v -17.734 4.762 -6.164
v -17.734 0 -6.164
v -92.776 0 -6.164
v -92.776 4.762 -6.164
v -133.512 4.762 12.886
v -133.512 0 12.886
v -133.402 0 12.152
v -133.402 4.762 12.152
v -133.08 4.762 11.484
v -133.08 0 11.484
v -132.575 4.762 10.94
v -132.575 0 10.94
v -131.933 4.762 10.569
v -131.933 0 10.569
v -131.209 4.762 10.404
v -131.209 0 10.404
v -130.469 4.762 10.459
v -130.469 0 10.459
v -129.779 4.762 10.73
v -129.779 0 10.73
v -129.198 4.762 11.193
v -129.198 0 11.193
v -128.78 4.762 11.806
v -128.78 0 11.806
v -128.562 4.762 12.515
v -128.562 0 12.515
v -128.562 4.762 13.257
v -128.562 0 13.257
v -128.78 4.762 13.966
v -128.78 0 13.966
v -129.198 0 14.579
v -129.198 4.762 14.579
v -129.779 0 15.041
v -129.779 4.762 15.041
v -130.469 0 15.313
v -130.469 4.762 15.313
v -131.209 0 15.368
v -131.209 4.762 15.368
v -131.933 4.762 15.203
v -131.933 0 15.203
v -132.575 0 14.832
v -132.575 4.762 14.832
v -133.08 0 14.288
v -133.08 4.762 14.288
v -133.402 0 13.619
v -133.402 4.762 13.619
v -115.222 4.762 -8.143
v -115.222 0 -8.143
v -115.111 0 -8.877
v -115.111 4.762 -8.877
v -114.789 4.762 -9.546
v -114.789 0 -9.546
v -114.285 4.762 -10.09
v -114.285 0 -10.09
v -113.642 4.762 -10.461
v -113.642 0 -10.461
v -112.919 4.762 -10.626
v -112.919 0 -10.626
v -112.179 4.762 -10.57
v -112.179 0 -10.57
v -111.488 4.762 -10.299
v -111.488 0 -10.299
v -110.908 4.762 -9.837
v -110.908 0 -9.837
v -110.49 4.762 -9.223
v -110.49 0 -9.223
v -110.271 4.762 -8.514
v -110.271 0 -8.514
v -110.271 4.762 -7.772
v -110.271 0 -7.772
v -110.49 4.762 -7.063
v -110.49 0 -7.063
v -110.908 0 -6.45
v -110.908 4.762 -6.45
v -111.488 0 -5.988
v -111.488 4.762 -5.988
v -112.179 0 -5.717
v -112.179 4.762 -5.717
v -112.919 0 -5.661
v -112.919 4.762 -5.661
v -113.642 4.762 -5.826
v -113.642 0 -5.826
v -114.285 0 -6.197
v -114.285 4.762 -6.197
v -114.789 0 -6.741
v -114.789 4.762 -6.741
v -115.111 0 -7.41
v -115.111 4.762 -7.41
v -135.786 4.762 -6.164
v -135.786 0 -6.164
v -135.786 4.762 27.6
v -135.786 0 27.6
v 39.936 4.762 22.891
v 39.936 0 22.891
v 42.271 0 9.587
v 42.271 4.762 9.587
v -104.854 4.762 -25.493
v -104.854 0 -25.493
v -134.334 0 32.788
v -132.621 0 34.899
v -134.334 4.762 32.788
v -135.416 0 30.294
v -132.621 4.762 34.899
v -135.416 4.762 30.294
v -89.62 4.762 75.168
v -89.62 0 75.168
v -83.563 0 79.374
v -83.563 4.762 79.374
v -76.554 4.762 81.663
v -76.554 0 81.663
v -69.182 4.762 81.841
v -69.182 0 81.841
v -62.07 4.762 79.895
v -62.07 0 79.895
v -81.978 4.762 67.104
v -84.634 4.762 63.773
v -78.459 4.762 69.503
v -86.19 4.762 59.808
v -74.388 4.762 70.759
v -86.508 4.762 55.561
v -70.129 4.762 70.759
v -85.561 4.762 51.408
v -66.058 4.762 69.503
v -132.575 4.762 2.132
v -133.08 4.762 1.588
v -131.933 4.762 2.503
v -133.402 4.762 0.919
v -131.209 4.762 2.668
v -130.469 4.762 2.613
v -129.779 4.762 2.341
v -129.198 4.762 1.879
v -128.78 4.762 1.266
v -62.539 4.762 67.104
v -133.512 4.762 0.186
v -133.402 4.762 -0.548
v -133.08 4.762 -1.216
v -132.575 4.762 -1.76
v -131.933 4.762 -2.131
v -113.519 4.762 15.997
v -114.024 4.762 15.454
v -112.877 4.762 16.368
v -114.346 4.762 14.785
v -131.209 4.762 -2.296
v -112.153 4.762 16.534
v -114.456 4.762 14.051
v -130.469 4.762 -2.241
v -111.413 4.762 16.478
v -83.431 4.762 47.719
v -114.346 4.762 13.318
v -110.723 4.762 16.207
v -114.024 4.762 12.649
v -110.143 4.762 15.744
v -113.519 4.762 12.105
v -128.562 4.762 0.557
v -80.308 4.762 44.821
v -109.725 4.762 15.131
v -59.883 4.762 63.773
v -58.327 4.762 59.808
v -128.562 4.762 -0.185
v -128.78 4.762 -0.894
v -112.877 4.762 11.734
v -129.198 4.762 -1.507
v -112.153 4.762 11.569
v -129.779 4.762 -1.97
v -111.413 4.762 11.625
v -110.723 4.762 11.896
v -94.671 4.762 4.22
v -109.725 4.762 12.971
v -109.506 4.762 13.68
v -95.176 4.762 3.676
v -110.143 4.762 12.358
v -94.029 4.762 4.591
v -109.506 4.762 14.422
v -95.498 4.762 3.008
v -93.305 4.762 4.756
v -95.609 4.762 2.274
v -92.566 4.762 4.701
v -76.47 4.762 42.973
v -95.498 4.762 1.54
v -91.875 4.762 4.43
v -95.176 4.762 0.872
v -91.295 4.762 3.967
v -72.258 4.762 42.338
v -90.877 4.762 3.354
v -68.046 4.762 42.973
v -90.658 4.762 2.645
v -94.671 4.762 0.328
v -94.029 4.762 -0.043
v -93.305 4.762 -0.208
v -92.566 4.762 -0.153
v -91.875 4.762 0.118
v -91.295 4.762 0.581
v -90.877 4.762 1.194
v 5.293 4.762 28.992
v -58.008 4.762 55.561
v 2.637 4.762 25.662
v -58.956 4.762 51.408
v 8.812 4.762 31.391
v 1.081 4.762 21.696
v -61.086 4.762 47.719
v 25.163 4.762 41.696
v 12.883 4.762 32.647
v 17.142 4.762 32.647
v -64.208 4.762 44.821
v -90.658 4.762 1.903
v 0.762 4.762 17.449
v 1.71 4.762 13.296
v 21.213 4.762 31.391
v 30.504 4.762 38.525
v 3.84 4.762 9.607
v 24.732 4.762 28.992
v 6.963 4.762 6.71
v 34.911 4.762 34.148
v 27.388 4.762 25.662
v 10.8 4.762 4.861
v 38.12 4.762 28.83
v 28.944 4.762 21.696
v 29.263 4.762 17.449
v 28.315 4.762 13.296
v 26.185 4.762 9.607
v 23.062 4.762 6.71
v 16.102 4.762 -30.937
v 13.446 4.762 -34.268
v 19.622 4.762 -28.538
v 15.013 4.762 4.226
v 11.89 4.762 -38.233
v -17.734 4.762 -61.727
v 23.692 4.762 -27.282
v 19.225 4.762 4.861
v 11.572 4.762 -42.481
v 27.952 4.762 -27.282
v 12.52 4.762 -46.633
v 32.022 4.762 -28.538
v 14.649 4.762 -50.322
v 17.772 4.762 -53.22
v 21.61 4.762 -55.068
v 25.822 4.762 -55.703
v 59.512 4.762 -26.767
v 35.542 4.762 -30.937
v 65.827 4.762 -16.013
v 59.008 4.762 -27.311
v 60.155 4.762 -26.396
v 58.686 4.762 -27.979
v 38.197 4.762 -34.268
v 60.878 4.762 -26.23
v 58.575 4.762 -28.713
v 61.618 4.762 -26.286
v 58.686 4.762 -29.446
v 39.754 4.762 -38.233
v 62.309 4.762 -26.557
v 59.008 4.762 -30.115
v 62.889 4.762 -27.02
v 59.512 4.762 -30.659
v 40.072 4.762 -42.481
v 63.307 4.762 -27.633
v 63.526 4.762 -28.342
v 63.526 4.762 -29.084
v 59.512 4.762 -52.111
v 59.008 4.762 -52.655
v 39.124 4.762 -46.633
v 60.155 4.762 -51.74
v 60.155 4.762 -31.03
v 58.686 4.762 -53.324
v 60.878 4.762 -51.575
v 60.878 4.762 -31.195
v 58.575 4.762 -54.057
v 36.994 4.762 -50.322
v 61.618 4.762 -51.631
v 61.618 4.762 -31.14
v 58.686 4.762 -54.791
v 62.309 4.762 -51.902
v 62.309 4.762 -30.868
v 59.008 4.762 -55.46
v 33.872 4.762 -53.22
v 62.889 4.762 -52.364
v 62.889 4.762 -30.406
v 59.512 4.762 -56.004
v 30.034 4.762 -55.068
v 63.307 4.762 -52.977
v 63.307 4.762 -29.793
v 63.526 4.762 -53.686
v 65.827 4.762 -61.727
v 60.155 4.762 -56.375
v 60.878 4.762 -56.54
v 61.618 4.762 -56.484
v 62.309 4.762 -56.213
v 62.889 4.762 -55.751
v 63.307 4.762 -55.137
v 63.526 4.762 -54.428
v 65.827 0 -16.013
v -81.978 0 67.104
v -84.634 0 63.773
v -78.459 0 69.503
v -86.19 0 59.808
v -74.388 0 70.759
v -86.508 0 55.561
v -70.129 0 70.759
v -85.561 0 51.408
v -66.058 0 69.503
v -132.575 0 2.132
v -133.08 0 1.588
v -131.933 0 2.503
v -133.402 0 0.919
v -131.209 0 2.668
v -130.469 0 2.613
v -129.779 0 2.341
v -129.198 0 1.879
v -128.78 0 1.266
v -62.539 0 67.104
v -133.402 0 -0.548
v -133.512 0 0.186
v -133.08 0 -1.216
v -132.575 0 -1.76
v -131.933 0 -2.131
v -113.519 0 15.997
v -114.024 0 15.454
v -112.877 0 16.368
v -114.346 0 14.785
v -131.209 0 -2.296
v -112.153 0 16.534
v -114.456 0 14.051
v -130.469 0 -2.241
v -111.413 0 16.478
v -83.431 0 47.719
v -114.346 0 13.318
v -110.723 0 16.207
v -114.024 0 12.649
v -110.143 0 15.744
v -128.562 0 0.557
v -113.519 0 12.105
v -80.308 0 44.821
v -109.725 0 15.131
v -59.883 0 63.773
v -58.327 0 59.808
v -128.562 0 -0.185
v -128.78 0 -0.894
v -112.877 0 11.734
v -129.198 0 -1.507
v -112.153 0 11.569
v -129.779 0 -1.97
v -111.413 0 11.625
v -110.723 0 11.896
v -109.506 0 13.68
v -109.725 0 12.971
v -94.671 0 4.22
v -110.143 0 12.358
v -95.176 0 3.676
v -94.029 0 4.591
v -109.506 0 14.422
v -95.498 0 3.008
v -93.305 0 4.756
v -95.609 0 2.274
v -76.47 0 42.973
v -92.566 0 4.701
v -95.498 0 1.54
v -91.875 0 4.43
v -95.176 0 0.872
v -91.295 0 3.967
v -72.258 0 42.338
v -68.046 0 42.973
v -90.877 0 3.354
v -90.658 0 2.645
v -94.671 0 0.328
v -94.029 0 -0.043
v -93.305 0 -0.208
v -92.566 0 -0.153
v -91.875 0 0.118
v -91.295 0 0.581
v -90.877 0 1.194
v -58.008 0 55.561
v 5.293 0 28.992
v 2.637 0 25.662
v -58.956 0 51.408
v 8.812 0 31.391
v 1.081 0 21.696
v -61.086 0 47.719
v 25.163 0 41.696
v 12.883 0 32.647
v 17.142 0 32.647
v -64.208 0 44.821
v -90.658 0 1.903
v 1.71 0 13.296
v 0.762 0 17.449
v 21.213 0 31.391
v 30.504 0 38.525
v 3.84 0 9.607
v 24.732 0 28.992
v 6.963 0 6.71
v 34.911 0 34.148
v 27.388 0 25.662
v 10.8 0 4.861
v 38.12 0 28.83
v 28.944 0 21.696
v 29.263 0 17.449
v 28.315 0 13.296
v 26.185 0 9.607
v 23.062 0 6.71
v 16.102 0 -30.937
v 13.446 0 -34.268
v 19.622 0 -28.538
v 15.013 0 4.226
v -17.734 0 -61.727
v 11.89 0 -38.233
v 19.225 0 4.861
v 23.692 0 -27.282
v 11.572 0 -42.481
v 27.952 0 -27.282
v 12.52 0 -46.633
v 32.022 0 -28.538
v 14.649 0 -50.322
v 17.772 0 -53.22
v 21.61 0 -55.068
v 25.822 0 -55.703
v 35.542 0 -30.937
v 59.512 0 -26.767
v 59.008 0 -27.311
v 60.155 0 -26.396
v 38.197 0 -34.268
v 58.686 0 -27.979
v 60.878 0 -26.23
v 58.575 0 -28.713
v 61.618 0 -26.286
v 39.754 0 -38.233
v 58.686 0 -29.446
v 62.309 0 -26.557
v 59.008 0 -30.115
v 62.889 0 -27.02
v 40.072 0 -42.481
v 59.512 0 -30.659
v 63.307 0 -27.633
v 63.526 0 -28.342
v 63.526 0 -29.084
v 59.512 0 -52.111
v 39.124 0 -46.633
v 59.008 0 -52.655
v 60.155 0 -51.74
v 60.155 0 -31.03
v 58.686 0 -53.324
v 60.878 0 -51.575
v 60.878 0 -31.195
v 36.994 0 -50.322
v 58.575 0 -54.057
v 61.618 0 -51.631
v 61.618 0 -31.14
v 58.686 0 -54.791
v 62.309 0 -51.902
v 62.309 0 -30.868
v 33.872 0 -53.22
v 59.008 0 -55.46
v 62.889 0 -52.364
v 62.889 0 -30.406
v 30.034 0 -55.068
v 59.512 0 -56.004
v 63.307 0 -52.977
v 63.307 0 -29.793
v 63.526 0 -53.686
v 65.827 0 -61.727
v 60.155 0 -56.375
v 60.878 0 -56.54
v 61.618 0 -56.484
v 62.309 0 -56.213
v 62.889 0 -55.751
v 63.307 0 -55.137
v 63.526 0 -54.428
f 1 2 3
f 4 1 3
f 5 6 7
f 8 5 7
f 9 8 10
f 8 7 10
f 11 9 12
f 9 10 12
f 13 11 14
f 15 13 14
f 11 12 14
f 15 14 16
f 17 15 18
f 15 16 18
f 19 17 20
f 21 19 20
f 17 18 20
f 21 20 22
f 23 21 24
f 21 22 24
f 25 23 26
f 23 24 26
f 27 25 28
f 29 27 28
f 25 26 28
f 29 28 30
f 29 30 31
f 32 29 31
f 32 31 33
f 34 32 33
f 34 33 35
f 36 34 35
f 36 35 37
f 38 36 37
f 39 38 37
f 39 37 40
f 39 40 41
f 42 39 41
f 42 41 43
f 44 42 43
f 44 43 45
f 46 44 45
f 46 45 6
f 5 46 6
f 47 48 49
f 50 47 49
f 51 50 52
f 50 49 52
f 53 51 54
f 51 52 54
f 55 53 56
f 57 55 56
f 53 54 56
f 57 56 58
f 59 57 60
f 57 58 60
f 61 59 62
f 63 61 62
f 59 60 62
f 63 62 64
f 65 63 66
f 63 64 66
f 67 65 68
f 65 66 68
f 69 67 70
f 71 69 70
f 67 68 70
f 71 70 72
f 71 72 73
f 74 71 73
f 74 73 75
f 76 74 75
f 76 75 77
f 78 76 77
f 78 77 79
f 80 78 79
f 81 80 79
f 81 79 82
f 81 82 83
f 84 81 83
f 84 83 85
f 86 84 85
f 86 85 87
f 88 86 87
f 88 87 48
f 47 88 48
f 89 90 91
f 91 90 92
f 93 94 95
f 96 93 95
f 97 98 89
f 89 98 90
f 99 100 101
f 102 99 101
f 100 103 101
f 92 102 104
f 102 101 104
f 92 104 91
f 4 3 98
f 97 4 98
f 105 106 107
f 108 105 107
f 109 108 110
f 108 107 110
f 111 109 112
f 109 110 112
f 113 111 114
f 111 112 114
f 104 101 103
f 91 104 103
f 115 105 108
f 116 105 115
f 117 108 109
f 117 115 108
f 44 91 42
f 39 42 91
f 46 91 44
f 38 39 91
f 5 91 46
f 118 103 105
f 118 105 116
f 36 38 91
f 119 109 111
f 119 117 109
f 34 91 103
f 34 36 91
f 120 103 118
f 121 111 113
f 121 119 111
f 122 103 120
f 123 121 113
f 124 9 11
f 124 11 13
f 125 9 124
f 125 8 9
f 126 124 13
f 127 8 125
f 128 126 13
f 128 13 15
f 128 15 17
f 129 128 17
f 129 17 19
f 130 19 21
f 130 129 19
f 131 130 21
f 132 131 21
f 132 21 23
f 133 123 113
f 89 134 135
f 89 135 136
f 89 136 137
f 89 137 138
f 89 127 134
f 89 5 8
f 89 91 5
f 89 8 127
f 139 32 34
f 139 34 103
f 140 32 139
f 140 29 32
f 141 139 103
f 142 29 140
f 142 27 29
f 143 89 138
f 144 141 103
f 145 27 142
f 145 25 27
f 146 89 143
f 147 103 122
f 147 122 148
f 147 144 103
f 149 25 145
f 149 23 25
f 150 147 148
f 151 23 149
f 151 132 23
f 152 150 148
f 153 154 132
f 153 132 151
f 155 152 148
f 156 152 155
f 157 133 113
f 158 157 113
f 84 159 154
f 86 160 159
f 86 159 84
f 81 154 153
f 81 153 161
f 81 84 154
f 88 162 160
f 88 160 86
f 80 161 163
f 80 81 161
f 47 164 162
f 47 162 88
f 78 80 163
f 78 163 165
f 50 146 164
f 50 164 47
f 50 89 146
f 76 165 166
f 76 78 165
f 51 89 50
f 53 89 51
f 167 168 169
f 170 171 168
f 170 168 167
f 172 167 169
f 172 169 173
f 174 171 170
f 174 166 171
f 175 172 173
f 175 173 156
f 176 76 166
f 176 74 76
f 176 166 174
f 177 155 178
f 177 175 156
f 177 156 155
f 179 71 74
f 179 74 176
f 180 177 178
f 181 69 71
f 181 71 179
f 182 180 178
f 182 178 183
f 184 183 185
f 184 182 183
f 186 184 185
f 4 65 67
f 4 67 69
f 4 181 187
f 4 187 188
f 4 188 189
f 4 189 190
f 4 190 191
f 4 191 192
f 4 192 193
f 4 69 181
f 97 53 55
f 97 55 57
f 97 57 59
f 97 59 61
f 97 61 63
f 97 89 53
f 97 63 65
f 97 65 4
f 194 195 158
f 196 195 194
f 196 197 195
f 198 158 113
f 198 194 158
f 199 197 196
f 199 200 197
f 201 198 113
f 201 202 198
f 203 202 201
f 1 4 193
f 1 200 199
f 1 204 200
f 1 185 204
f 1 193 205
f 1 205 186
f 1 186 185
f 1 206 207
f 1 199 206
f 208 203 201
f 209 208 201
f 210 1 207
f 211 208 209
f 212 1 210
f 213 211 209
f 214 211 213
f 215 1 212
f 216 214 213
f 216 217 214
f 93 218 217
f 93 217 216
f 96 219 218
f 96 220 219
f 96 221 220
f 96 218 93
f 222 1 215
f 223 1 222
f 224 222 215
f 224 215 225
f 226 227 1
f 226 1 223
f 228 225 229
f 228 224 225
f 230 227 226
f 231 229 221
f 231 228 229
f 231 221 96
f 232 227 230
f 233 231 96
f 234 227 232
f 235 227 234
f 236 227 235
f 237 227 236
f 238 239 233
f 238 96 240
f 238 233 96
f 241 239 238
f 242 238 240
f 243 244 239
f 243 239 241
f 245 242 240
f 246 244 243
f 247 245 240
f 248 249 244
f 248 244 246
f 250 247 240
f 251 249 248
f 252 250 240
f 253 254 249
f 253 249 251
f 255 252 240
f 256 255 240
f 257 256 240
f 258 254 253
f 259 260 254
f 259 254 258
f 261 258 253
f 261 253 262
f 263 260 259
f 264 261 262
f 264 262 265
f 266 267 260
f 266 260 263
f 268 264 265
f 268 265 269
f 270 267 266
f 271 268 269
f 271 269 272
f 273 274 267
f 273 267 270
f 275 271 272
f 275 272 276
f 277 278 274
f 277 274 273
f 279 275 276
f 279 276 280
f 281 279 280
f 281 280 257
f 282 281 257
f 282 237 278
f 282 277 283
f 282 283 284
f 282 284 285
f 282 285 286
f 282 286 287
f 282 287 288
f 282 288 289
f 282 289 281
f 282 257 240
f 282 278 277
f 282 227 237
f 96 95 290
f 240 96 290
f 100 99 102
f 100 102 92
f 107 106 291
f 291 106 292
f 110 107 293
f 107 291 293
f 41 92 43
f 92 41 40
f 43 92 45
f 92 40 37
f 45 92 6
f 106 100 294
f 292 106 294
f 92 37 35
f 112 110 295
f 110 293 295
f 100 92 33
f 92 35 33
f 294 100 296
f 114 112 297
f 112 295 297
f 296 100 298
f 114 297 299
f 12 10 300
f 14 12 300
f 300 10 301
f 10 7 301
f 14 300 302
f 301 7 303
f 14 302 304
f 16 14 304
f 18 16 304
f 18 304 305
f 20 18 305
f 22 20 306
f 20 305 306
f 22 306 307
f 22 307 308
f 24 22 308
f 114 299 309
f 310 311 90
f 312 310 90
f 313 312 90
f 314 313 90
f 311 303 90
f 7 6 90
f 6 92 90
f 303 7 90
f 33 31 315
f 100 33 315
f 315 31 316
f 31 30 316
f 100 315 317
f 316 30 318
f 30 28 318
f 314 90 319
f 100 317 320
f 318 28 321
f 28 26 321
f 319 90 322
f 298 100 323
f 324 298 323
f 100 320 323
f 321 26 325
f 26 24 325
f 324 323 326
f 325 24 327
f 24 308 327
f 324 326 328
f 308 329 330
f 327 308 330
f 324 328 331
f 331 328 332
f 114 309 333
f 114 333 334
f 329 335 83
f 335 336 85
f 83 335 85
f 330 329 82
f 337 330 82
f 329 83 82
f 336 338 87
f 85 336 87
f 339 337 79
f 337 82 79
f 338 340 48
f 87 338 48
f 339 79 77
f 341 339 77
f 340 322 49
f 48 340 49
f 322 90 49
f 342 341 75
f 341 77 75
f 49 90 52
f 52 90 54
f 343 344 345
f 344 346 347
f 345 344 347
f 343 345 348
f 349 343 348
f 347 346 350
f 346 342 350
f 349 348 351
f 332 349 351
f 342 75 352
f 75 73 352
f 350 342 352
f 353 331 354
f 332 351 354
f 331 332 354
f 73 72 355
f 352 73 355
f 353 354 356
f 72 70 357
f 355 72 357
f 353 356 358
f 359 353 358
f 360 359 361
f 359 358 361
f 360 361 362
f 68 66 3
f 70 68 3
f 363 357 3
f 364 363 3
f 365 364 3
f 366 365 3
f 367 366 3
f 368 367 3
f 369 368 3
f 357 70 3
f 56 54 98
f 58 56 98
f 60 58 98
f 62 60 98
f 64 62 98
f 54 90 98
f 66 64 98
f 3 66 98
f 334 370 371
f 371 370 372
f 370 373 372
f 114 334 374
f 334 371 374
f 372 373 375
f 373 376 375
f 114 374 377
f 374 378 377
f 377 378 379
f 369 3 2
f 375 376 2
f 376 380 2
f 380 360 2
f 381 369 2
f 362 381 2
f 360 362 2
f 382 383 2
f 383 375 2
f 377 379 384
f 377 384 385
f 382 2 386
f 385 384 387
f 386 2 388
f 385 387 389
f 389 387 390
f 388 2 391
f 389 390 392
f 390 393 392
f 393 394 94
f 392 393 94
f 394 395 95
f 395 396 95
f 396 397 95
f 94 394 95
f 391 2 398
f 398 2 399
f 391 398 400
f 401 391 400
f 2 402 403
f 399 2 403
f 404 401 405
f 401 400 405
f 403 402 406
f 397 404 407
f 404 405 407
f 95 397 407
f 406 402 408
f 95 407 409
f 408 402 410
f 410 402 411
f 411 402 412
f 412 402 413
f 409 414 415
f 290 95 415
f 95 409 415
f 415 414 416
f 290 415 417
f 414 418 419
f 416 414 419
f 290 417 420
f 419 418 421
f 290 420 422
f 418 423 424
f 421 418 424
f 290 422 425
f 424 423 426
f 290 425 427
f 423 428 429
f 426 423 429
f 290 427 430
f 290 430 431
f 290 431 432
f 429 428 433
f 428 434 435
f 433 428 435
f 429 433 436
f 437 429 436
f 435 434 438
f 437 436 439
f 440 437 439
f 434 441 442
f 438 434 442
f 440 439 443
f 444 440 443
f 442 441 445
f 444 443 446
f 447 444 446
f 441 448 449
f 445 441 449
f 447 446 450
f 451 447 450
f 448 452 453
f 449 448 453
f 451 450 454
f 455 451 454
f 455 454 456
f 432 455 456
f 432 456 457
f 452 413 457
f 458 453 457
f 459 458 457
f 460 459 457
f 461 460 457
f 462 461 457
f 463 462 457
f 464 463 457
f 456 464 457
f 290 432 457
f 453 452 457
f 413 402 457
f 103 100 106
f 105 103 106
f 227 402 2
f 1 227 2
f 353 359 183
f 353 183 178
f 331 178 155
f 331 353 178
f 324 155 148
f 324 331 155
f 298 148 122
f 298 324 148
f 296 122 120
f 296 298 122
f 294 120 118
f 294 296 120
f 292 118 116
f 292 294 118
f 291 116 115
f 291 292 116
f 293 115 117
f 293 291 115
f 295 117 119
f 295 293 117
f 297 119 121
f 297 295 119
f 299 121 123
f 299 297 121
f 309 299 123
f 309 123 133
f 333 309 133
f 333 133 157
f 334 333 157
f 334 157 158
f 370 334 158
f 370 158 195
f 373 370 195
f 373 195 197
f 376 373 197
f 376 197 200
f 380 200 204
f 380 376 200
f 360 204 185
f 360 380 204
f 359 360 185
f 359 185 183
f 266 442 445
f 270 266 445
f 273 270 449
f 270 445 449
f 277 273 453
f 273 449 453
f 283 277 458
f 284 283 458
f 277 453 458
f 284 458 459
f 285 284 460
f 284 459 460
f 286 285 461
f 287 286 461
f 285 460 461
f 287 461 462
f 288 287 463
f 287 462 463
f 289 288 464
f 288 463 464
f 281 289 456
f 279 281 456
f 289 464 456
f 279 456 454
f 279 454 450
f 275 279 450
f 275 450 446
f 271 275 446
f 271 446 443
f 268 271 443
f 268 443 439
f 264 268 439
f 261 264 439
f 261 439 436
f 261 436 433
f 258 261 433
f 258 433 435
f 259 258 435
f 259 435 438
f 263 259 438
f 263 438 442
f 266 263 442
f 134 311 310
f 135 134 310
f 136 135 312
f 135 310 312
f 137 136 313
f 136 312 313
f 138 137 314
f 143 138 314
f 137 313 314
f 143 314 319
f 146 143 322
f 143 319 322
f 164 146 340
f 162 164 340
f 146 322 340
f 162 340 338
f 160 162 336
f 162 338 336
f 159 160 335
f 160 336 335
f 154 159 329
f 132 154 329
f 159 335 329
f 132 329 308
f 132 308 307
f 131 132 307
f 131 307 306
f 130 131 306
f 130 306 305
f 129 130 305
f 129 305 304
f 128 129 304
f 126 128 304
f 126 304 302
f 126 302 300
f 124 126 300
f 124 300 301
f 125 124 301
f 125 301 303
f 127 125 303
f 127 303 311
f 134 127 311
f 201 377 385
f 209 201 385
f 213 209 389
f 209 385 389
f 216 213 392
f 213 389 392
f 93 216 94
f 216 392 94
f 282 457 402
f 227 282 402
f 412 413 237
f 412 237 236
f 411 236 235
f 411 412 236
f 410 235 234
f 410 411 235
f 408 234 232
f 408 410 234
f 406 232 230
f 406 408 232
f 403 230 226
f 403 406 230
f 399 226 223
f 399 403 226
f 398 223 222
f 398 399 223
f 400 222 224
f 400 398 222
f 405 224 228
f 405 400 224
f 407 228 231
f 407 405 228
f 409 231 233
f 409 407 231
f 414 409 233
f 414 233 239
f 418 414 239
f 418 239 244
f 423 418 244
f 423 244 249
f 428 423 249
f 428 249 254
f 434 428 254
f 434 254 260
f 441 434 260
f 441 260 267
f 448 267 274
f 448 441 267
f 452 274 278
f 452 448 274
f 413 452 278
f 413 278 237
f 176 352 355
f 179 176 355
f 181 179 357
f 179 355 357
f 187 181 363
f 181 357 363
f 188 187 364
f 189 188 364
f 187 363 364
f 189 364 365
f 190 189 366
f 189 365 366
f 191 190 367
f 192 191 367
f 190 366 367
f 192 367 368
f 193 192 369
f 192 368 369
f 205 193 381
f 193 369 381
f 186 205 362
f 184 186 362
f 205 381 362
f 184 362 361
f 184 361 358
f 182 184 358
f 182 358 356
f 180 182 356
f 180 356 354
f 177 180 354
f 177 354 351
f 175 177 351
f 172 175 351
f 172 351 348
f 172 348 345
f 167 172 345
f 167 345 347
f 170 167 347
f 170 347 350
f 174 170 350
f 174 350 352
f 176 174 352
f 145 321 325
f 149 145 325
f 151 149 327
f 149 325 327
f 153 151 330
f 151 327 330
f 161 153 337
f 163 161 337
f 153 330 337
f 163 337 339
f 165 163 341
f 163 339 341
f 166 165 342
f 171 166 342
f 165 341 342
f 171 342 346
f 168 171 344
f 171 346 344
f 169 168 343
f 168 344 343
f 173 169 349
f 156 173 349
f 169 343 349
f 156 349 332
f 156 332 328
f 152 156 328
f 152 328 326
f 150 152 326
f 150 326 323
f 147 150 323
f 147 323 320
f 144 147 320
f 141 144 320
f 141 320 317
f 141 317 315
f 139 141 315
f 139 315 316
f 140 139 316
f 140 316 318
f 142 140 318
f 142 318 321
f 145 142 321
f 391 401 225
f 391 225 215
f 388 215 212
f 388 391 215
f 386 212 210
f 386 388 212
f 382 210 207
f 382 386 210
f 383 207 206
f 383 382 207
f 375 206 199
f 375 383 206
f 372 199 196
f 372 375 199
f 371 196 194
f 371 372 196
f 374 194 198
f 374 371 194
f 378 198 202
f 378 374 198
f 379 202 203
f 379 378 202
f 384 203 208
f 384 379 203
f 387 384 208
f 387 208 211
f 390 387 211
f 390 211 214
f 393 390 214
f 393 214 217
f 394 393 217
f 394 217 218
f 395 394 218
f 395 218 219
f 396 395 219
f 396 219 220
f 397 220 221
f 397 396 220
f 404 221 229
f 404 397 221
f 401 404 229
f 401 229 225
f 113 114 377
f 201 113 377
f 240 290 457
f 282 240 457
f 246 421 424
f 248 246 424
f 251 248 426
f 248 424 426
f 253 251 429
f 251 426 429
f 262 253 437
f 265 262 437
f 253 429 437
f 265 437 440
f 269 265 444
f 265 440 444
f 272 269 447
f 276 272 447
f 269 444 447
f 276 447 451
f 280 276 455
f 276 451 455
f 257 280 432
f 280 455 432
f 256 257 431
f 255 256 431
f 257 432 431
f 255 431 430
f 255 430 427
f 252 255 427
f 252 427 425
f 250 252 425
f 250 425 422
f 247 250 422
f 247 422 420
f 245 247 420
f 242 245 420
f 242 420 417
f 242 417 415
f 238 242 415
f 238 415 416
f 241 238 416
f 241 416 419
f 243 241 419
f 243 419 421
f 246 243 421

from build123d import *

# Parameters (mm, degrees)
SKETCH1_R              = 14.29004
BOSS_EXTRUDE1_DEPTH    = 4.7625
FILLET1_R              = 10
F_10_CLEARANCE_HOLE1_D = 4.9784
F_10_CLEARANCE_HOLE2_D = 4.9784


with BuildPart() as part:
    # Sketch1 → Boss-Extrude1 (new body)
    with BuildSketch(Plane(origin=(0, 0, 0), x_dir=(1, 0, 0), z_dir=(0, 1, 0))):
        with BuildLine():
            Line((-62.06952, -79.895280222), (25.163028109, -41.695780276))
            ThreePointArc((25.163028109, -41.695780276), (34.911191298, -34.148496119), (39.936134607, -22.890693115))
            Line((39.936134607, -22.890693115), (42.271095404, -9.586739751))
            Line((42.271095404, -9.586739751), (65.82695514, 16.012754812))
            Line((65.82695514, 16.012754812), (65.826833771, 61.726825209))
            Line((65.826833771, 61.726825209), (-17.734439664, 61.726825209))
            Line((-17.734439664, 61.726825209), (-17.734439664, 6.164245545))
            Line((-17.734439664, 6.164245545), (-92.776319002, 6.164245545))
            Line((-92.776319002, 6.164245545), (-104.854054452, 25.49254843))
            Line((-104.854054452, 25.49254843), (-135.785609254, 6.16425364))
            Line((-135.785609254, 6.16425364), (-135.785609254, -31.935712293))
            Line((-135.785609254, -31.935712293), (-89.620113812, -75.16814328))
            ThreePointArc((-89.620113812, -75.16814328), (-76.553580444, -81.662511553), (-62.06952, -79.895280222))
        make_face()
        with Locations(Location((25.821833771, 41.412625209, 0), (0, 0, 90))):
            Circle(SKETCH1_R, mode=Mode.SUBTRACT)
        with Locations(Location((15.012562201, -18.516537909, 0), (0, 0, 90))):
            Circle(SKETCH1_R, mode=Mode.SUBTRACT)
        with Locations(Location((-72.258332946, -56.628468385, 0), (0, 0, 90))):
            Circle(SKETCH1_R, mode=Mode.SUBTRACT)
    extrude(amount=BOSS_EXTRUDE1_DEPTH)

    # Fillet1
    fillet1_edges = [part.edges().sort_by_distance(p)[0] for p in [
        (-135.785609254, 2.38125, 31.935712293),
    ]]
    fillet(fillet1_edges, radius=FILLET1_R)

    # #10 Clearance Hole1 (through all)
    with Locations(Plane(origin=(0, 4.7625, 0), x_dir=(1, 0, 0), z_dir=(0, 1, 0))):
        with Locations((61.064354133, 54.057452946), (61.064421422, 28.712718776), (-131.023109254, -0.185754455), (-131.023109254, -12.885754455)):
            Hole(F_10_CLEARANCE_HOLE1_D / 2)

    # #10 Clearance Hole2 (through all)
    with Locations(Plane(origin=(0, 4.7625, 0), x_dir=(1, 0, 0), z_dir=(0, 1, 0))):
        with Locations((-111.967266406, -14.051352939), (-93.119428737, -2.273847251), (-112.732572492, 8.143472036)):
            Hole(F_10_CLEARANCE_HOLE2_D / 2)


solid = part.part
